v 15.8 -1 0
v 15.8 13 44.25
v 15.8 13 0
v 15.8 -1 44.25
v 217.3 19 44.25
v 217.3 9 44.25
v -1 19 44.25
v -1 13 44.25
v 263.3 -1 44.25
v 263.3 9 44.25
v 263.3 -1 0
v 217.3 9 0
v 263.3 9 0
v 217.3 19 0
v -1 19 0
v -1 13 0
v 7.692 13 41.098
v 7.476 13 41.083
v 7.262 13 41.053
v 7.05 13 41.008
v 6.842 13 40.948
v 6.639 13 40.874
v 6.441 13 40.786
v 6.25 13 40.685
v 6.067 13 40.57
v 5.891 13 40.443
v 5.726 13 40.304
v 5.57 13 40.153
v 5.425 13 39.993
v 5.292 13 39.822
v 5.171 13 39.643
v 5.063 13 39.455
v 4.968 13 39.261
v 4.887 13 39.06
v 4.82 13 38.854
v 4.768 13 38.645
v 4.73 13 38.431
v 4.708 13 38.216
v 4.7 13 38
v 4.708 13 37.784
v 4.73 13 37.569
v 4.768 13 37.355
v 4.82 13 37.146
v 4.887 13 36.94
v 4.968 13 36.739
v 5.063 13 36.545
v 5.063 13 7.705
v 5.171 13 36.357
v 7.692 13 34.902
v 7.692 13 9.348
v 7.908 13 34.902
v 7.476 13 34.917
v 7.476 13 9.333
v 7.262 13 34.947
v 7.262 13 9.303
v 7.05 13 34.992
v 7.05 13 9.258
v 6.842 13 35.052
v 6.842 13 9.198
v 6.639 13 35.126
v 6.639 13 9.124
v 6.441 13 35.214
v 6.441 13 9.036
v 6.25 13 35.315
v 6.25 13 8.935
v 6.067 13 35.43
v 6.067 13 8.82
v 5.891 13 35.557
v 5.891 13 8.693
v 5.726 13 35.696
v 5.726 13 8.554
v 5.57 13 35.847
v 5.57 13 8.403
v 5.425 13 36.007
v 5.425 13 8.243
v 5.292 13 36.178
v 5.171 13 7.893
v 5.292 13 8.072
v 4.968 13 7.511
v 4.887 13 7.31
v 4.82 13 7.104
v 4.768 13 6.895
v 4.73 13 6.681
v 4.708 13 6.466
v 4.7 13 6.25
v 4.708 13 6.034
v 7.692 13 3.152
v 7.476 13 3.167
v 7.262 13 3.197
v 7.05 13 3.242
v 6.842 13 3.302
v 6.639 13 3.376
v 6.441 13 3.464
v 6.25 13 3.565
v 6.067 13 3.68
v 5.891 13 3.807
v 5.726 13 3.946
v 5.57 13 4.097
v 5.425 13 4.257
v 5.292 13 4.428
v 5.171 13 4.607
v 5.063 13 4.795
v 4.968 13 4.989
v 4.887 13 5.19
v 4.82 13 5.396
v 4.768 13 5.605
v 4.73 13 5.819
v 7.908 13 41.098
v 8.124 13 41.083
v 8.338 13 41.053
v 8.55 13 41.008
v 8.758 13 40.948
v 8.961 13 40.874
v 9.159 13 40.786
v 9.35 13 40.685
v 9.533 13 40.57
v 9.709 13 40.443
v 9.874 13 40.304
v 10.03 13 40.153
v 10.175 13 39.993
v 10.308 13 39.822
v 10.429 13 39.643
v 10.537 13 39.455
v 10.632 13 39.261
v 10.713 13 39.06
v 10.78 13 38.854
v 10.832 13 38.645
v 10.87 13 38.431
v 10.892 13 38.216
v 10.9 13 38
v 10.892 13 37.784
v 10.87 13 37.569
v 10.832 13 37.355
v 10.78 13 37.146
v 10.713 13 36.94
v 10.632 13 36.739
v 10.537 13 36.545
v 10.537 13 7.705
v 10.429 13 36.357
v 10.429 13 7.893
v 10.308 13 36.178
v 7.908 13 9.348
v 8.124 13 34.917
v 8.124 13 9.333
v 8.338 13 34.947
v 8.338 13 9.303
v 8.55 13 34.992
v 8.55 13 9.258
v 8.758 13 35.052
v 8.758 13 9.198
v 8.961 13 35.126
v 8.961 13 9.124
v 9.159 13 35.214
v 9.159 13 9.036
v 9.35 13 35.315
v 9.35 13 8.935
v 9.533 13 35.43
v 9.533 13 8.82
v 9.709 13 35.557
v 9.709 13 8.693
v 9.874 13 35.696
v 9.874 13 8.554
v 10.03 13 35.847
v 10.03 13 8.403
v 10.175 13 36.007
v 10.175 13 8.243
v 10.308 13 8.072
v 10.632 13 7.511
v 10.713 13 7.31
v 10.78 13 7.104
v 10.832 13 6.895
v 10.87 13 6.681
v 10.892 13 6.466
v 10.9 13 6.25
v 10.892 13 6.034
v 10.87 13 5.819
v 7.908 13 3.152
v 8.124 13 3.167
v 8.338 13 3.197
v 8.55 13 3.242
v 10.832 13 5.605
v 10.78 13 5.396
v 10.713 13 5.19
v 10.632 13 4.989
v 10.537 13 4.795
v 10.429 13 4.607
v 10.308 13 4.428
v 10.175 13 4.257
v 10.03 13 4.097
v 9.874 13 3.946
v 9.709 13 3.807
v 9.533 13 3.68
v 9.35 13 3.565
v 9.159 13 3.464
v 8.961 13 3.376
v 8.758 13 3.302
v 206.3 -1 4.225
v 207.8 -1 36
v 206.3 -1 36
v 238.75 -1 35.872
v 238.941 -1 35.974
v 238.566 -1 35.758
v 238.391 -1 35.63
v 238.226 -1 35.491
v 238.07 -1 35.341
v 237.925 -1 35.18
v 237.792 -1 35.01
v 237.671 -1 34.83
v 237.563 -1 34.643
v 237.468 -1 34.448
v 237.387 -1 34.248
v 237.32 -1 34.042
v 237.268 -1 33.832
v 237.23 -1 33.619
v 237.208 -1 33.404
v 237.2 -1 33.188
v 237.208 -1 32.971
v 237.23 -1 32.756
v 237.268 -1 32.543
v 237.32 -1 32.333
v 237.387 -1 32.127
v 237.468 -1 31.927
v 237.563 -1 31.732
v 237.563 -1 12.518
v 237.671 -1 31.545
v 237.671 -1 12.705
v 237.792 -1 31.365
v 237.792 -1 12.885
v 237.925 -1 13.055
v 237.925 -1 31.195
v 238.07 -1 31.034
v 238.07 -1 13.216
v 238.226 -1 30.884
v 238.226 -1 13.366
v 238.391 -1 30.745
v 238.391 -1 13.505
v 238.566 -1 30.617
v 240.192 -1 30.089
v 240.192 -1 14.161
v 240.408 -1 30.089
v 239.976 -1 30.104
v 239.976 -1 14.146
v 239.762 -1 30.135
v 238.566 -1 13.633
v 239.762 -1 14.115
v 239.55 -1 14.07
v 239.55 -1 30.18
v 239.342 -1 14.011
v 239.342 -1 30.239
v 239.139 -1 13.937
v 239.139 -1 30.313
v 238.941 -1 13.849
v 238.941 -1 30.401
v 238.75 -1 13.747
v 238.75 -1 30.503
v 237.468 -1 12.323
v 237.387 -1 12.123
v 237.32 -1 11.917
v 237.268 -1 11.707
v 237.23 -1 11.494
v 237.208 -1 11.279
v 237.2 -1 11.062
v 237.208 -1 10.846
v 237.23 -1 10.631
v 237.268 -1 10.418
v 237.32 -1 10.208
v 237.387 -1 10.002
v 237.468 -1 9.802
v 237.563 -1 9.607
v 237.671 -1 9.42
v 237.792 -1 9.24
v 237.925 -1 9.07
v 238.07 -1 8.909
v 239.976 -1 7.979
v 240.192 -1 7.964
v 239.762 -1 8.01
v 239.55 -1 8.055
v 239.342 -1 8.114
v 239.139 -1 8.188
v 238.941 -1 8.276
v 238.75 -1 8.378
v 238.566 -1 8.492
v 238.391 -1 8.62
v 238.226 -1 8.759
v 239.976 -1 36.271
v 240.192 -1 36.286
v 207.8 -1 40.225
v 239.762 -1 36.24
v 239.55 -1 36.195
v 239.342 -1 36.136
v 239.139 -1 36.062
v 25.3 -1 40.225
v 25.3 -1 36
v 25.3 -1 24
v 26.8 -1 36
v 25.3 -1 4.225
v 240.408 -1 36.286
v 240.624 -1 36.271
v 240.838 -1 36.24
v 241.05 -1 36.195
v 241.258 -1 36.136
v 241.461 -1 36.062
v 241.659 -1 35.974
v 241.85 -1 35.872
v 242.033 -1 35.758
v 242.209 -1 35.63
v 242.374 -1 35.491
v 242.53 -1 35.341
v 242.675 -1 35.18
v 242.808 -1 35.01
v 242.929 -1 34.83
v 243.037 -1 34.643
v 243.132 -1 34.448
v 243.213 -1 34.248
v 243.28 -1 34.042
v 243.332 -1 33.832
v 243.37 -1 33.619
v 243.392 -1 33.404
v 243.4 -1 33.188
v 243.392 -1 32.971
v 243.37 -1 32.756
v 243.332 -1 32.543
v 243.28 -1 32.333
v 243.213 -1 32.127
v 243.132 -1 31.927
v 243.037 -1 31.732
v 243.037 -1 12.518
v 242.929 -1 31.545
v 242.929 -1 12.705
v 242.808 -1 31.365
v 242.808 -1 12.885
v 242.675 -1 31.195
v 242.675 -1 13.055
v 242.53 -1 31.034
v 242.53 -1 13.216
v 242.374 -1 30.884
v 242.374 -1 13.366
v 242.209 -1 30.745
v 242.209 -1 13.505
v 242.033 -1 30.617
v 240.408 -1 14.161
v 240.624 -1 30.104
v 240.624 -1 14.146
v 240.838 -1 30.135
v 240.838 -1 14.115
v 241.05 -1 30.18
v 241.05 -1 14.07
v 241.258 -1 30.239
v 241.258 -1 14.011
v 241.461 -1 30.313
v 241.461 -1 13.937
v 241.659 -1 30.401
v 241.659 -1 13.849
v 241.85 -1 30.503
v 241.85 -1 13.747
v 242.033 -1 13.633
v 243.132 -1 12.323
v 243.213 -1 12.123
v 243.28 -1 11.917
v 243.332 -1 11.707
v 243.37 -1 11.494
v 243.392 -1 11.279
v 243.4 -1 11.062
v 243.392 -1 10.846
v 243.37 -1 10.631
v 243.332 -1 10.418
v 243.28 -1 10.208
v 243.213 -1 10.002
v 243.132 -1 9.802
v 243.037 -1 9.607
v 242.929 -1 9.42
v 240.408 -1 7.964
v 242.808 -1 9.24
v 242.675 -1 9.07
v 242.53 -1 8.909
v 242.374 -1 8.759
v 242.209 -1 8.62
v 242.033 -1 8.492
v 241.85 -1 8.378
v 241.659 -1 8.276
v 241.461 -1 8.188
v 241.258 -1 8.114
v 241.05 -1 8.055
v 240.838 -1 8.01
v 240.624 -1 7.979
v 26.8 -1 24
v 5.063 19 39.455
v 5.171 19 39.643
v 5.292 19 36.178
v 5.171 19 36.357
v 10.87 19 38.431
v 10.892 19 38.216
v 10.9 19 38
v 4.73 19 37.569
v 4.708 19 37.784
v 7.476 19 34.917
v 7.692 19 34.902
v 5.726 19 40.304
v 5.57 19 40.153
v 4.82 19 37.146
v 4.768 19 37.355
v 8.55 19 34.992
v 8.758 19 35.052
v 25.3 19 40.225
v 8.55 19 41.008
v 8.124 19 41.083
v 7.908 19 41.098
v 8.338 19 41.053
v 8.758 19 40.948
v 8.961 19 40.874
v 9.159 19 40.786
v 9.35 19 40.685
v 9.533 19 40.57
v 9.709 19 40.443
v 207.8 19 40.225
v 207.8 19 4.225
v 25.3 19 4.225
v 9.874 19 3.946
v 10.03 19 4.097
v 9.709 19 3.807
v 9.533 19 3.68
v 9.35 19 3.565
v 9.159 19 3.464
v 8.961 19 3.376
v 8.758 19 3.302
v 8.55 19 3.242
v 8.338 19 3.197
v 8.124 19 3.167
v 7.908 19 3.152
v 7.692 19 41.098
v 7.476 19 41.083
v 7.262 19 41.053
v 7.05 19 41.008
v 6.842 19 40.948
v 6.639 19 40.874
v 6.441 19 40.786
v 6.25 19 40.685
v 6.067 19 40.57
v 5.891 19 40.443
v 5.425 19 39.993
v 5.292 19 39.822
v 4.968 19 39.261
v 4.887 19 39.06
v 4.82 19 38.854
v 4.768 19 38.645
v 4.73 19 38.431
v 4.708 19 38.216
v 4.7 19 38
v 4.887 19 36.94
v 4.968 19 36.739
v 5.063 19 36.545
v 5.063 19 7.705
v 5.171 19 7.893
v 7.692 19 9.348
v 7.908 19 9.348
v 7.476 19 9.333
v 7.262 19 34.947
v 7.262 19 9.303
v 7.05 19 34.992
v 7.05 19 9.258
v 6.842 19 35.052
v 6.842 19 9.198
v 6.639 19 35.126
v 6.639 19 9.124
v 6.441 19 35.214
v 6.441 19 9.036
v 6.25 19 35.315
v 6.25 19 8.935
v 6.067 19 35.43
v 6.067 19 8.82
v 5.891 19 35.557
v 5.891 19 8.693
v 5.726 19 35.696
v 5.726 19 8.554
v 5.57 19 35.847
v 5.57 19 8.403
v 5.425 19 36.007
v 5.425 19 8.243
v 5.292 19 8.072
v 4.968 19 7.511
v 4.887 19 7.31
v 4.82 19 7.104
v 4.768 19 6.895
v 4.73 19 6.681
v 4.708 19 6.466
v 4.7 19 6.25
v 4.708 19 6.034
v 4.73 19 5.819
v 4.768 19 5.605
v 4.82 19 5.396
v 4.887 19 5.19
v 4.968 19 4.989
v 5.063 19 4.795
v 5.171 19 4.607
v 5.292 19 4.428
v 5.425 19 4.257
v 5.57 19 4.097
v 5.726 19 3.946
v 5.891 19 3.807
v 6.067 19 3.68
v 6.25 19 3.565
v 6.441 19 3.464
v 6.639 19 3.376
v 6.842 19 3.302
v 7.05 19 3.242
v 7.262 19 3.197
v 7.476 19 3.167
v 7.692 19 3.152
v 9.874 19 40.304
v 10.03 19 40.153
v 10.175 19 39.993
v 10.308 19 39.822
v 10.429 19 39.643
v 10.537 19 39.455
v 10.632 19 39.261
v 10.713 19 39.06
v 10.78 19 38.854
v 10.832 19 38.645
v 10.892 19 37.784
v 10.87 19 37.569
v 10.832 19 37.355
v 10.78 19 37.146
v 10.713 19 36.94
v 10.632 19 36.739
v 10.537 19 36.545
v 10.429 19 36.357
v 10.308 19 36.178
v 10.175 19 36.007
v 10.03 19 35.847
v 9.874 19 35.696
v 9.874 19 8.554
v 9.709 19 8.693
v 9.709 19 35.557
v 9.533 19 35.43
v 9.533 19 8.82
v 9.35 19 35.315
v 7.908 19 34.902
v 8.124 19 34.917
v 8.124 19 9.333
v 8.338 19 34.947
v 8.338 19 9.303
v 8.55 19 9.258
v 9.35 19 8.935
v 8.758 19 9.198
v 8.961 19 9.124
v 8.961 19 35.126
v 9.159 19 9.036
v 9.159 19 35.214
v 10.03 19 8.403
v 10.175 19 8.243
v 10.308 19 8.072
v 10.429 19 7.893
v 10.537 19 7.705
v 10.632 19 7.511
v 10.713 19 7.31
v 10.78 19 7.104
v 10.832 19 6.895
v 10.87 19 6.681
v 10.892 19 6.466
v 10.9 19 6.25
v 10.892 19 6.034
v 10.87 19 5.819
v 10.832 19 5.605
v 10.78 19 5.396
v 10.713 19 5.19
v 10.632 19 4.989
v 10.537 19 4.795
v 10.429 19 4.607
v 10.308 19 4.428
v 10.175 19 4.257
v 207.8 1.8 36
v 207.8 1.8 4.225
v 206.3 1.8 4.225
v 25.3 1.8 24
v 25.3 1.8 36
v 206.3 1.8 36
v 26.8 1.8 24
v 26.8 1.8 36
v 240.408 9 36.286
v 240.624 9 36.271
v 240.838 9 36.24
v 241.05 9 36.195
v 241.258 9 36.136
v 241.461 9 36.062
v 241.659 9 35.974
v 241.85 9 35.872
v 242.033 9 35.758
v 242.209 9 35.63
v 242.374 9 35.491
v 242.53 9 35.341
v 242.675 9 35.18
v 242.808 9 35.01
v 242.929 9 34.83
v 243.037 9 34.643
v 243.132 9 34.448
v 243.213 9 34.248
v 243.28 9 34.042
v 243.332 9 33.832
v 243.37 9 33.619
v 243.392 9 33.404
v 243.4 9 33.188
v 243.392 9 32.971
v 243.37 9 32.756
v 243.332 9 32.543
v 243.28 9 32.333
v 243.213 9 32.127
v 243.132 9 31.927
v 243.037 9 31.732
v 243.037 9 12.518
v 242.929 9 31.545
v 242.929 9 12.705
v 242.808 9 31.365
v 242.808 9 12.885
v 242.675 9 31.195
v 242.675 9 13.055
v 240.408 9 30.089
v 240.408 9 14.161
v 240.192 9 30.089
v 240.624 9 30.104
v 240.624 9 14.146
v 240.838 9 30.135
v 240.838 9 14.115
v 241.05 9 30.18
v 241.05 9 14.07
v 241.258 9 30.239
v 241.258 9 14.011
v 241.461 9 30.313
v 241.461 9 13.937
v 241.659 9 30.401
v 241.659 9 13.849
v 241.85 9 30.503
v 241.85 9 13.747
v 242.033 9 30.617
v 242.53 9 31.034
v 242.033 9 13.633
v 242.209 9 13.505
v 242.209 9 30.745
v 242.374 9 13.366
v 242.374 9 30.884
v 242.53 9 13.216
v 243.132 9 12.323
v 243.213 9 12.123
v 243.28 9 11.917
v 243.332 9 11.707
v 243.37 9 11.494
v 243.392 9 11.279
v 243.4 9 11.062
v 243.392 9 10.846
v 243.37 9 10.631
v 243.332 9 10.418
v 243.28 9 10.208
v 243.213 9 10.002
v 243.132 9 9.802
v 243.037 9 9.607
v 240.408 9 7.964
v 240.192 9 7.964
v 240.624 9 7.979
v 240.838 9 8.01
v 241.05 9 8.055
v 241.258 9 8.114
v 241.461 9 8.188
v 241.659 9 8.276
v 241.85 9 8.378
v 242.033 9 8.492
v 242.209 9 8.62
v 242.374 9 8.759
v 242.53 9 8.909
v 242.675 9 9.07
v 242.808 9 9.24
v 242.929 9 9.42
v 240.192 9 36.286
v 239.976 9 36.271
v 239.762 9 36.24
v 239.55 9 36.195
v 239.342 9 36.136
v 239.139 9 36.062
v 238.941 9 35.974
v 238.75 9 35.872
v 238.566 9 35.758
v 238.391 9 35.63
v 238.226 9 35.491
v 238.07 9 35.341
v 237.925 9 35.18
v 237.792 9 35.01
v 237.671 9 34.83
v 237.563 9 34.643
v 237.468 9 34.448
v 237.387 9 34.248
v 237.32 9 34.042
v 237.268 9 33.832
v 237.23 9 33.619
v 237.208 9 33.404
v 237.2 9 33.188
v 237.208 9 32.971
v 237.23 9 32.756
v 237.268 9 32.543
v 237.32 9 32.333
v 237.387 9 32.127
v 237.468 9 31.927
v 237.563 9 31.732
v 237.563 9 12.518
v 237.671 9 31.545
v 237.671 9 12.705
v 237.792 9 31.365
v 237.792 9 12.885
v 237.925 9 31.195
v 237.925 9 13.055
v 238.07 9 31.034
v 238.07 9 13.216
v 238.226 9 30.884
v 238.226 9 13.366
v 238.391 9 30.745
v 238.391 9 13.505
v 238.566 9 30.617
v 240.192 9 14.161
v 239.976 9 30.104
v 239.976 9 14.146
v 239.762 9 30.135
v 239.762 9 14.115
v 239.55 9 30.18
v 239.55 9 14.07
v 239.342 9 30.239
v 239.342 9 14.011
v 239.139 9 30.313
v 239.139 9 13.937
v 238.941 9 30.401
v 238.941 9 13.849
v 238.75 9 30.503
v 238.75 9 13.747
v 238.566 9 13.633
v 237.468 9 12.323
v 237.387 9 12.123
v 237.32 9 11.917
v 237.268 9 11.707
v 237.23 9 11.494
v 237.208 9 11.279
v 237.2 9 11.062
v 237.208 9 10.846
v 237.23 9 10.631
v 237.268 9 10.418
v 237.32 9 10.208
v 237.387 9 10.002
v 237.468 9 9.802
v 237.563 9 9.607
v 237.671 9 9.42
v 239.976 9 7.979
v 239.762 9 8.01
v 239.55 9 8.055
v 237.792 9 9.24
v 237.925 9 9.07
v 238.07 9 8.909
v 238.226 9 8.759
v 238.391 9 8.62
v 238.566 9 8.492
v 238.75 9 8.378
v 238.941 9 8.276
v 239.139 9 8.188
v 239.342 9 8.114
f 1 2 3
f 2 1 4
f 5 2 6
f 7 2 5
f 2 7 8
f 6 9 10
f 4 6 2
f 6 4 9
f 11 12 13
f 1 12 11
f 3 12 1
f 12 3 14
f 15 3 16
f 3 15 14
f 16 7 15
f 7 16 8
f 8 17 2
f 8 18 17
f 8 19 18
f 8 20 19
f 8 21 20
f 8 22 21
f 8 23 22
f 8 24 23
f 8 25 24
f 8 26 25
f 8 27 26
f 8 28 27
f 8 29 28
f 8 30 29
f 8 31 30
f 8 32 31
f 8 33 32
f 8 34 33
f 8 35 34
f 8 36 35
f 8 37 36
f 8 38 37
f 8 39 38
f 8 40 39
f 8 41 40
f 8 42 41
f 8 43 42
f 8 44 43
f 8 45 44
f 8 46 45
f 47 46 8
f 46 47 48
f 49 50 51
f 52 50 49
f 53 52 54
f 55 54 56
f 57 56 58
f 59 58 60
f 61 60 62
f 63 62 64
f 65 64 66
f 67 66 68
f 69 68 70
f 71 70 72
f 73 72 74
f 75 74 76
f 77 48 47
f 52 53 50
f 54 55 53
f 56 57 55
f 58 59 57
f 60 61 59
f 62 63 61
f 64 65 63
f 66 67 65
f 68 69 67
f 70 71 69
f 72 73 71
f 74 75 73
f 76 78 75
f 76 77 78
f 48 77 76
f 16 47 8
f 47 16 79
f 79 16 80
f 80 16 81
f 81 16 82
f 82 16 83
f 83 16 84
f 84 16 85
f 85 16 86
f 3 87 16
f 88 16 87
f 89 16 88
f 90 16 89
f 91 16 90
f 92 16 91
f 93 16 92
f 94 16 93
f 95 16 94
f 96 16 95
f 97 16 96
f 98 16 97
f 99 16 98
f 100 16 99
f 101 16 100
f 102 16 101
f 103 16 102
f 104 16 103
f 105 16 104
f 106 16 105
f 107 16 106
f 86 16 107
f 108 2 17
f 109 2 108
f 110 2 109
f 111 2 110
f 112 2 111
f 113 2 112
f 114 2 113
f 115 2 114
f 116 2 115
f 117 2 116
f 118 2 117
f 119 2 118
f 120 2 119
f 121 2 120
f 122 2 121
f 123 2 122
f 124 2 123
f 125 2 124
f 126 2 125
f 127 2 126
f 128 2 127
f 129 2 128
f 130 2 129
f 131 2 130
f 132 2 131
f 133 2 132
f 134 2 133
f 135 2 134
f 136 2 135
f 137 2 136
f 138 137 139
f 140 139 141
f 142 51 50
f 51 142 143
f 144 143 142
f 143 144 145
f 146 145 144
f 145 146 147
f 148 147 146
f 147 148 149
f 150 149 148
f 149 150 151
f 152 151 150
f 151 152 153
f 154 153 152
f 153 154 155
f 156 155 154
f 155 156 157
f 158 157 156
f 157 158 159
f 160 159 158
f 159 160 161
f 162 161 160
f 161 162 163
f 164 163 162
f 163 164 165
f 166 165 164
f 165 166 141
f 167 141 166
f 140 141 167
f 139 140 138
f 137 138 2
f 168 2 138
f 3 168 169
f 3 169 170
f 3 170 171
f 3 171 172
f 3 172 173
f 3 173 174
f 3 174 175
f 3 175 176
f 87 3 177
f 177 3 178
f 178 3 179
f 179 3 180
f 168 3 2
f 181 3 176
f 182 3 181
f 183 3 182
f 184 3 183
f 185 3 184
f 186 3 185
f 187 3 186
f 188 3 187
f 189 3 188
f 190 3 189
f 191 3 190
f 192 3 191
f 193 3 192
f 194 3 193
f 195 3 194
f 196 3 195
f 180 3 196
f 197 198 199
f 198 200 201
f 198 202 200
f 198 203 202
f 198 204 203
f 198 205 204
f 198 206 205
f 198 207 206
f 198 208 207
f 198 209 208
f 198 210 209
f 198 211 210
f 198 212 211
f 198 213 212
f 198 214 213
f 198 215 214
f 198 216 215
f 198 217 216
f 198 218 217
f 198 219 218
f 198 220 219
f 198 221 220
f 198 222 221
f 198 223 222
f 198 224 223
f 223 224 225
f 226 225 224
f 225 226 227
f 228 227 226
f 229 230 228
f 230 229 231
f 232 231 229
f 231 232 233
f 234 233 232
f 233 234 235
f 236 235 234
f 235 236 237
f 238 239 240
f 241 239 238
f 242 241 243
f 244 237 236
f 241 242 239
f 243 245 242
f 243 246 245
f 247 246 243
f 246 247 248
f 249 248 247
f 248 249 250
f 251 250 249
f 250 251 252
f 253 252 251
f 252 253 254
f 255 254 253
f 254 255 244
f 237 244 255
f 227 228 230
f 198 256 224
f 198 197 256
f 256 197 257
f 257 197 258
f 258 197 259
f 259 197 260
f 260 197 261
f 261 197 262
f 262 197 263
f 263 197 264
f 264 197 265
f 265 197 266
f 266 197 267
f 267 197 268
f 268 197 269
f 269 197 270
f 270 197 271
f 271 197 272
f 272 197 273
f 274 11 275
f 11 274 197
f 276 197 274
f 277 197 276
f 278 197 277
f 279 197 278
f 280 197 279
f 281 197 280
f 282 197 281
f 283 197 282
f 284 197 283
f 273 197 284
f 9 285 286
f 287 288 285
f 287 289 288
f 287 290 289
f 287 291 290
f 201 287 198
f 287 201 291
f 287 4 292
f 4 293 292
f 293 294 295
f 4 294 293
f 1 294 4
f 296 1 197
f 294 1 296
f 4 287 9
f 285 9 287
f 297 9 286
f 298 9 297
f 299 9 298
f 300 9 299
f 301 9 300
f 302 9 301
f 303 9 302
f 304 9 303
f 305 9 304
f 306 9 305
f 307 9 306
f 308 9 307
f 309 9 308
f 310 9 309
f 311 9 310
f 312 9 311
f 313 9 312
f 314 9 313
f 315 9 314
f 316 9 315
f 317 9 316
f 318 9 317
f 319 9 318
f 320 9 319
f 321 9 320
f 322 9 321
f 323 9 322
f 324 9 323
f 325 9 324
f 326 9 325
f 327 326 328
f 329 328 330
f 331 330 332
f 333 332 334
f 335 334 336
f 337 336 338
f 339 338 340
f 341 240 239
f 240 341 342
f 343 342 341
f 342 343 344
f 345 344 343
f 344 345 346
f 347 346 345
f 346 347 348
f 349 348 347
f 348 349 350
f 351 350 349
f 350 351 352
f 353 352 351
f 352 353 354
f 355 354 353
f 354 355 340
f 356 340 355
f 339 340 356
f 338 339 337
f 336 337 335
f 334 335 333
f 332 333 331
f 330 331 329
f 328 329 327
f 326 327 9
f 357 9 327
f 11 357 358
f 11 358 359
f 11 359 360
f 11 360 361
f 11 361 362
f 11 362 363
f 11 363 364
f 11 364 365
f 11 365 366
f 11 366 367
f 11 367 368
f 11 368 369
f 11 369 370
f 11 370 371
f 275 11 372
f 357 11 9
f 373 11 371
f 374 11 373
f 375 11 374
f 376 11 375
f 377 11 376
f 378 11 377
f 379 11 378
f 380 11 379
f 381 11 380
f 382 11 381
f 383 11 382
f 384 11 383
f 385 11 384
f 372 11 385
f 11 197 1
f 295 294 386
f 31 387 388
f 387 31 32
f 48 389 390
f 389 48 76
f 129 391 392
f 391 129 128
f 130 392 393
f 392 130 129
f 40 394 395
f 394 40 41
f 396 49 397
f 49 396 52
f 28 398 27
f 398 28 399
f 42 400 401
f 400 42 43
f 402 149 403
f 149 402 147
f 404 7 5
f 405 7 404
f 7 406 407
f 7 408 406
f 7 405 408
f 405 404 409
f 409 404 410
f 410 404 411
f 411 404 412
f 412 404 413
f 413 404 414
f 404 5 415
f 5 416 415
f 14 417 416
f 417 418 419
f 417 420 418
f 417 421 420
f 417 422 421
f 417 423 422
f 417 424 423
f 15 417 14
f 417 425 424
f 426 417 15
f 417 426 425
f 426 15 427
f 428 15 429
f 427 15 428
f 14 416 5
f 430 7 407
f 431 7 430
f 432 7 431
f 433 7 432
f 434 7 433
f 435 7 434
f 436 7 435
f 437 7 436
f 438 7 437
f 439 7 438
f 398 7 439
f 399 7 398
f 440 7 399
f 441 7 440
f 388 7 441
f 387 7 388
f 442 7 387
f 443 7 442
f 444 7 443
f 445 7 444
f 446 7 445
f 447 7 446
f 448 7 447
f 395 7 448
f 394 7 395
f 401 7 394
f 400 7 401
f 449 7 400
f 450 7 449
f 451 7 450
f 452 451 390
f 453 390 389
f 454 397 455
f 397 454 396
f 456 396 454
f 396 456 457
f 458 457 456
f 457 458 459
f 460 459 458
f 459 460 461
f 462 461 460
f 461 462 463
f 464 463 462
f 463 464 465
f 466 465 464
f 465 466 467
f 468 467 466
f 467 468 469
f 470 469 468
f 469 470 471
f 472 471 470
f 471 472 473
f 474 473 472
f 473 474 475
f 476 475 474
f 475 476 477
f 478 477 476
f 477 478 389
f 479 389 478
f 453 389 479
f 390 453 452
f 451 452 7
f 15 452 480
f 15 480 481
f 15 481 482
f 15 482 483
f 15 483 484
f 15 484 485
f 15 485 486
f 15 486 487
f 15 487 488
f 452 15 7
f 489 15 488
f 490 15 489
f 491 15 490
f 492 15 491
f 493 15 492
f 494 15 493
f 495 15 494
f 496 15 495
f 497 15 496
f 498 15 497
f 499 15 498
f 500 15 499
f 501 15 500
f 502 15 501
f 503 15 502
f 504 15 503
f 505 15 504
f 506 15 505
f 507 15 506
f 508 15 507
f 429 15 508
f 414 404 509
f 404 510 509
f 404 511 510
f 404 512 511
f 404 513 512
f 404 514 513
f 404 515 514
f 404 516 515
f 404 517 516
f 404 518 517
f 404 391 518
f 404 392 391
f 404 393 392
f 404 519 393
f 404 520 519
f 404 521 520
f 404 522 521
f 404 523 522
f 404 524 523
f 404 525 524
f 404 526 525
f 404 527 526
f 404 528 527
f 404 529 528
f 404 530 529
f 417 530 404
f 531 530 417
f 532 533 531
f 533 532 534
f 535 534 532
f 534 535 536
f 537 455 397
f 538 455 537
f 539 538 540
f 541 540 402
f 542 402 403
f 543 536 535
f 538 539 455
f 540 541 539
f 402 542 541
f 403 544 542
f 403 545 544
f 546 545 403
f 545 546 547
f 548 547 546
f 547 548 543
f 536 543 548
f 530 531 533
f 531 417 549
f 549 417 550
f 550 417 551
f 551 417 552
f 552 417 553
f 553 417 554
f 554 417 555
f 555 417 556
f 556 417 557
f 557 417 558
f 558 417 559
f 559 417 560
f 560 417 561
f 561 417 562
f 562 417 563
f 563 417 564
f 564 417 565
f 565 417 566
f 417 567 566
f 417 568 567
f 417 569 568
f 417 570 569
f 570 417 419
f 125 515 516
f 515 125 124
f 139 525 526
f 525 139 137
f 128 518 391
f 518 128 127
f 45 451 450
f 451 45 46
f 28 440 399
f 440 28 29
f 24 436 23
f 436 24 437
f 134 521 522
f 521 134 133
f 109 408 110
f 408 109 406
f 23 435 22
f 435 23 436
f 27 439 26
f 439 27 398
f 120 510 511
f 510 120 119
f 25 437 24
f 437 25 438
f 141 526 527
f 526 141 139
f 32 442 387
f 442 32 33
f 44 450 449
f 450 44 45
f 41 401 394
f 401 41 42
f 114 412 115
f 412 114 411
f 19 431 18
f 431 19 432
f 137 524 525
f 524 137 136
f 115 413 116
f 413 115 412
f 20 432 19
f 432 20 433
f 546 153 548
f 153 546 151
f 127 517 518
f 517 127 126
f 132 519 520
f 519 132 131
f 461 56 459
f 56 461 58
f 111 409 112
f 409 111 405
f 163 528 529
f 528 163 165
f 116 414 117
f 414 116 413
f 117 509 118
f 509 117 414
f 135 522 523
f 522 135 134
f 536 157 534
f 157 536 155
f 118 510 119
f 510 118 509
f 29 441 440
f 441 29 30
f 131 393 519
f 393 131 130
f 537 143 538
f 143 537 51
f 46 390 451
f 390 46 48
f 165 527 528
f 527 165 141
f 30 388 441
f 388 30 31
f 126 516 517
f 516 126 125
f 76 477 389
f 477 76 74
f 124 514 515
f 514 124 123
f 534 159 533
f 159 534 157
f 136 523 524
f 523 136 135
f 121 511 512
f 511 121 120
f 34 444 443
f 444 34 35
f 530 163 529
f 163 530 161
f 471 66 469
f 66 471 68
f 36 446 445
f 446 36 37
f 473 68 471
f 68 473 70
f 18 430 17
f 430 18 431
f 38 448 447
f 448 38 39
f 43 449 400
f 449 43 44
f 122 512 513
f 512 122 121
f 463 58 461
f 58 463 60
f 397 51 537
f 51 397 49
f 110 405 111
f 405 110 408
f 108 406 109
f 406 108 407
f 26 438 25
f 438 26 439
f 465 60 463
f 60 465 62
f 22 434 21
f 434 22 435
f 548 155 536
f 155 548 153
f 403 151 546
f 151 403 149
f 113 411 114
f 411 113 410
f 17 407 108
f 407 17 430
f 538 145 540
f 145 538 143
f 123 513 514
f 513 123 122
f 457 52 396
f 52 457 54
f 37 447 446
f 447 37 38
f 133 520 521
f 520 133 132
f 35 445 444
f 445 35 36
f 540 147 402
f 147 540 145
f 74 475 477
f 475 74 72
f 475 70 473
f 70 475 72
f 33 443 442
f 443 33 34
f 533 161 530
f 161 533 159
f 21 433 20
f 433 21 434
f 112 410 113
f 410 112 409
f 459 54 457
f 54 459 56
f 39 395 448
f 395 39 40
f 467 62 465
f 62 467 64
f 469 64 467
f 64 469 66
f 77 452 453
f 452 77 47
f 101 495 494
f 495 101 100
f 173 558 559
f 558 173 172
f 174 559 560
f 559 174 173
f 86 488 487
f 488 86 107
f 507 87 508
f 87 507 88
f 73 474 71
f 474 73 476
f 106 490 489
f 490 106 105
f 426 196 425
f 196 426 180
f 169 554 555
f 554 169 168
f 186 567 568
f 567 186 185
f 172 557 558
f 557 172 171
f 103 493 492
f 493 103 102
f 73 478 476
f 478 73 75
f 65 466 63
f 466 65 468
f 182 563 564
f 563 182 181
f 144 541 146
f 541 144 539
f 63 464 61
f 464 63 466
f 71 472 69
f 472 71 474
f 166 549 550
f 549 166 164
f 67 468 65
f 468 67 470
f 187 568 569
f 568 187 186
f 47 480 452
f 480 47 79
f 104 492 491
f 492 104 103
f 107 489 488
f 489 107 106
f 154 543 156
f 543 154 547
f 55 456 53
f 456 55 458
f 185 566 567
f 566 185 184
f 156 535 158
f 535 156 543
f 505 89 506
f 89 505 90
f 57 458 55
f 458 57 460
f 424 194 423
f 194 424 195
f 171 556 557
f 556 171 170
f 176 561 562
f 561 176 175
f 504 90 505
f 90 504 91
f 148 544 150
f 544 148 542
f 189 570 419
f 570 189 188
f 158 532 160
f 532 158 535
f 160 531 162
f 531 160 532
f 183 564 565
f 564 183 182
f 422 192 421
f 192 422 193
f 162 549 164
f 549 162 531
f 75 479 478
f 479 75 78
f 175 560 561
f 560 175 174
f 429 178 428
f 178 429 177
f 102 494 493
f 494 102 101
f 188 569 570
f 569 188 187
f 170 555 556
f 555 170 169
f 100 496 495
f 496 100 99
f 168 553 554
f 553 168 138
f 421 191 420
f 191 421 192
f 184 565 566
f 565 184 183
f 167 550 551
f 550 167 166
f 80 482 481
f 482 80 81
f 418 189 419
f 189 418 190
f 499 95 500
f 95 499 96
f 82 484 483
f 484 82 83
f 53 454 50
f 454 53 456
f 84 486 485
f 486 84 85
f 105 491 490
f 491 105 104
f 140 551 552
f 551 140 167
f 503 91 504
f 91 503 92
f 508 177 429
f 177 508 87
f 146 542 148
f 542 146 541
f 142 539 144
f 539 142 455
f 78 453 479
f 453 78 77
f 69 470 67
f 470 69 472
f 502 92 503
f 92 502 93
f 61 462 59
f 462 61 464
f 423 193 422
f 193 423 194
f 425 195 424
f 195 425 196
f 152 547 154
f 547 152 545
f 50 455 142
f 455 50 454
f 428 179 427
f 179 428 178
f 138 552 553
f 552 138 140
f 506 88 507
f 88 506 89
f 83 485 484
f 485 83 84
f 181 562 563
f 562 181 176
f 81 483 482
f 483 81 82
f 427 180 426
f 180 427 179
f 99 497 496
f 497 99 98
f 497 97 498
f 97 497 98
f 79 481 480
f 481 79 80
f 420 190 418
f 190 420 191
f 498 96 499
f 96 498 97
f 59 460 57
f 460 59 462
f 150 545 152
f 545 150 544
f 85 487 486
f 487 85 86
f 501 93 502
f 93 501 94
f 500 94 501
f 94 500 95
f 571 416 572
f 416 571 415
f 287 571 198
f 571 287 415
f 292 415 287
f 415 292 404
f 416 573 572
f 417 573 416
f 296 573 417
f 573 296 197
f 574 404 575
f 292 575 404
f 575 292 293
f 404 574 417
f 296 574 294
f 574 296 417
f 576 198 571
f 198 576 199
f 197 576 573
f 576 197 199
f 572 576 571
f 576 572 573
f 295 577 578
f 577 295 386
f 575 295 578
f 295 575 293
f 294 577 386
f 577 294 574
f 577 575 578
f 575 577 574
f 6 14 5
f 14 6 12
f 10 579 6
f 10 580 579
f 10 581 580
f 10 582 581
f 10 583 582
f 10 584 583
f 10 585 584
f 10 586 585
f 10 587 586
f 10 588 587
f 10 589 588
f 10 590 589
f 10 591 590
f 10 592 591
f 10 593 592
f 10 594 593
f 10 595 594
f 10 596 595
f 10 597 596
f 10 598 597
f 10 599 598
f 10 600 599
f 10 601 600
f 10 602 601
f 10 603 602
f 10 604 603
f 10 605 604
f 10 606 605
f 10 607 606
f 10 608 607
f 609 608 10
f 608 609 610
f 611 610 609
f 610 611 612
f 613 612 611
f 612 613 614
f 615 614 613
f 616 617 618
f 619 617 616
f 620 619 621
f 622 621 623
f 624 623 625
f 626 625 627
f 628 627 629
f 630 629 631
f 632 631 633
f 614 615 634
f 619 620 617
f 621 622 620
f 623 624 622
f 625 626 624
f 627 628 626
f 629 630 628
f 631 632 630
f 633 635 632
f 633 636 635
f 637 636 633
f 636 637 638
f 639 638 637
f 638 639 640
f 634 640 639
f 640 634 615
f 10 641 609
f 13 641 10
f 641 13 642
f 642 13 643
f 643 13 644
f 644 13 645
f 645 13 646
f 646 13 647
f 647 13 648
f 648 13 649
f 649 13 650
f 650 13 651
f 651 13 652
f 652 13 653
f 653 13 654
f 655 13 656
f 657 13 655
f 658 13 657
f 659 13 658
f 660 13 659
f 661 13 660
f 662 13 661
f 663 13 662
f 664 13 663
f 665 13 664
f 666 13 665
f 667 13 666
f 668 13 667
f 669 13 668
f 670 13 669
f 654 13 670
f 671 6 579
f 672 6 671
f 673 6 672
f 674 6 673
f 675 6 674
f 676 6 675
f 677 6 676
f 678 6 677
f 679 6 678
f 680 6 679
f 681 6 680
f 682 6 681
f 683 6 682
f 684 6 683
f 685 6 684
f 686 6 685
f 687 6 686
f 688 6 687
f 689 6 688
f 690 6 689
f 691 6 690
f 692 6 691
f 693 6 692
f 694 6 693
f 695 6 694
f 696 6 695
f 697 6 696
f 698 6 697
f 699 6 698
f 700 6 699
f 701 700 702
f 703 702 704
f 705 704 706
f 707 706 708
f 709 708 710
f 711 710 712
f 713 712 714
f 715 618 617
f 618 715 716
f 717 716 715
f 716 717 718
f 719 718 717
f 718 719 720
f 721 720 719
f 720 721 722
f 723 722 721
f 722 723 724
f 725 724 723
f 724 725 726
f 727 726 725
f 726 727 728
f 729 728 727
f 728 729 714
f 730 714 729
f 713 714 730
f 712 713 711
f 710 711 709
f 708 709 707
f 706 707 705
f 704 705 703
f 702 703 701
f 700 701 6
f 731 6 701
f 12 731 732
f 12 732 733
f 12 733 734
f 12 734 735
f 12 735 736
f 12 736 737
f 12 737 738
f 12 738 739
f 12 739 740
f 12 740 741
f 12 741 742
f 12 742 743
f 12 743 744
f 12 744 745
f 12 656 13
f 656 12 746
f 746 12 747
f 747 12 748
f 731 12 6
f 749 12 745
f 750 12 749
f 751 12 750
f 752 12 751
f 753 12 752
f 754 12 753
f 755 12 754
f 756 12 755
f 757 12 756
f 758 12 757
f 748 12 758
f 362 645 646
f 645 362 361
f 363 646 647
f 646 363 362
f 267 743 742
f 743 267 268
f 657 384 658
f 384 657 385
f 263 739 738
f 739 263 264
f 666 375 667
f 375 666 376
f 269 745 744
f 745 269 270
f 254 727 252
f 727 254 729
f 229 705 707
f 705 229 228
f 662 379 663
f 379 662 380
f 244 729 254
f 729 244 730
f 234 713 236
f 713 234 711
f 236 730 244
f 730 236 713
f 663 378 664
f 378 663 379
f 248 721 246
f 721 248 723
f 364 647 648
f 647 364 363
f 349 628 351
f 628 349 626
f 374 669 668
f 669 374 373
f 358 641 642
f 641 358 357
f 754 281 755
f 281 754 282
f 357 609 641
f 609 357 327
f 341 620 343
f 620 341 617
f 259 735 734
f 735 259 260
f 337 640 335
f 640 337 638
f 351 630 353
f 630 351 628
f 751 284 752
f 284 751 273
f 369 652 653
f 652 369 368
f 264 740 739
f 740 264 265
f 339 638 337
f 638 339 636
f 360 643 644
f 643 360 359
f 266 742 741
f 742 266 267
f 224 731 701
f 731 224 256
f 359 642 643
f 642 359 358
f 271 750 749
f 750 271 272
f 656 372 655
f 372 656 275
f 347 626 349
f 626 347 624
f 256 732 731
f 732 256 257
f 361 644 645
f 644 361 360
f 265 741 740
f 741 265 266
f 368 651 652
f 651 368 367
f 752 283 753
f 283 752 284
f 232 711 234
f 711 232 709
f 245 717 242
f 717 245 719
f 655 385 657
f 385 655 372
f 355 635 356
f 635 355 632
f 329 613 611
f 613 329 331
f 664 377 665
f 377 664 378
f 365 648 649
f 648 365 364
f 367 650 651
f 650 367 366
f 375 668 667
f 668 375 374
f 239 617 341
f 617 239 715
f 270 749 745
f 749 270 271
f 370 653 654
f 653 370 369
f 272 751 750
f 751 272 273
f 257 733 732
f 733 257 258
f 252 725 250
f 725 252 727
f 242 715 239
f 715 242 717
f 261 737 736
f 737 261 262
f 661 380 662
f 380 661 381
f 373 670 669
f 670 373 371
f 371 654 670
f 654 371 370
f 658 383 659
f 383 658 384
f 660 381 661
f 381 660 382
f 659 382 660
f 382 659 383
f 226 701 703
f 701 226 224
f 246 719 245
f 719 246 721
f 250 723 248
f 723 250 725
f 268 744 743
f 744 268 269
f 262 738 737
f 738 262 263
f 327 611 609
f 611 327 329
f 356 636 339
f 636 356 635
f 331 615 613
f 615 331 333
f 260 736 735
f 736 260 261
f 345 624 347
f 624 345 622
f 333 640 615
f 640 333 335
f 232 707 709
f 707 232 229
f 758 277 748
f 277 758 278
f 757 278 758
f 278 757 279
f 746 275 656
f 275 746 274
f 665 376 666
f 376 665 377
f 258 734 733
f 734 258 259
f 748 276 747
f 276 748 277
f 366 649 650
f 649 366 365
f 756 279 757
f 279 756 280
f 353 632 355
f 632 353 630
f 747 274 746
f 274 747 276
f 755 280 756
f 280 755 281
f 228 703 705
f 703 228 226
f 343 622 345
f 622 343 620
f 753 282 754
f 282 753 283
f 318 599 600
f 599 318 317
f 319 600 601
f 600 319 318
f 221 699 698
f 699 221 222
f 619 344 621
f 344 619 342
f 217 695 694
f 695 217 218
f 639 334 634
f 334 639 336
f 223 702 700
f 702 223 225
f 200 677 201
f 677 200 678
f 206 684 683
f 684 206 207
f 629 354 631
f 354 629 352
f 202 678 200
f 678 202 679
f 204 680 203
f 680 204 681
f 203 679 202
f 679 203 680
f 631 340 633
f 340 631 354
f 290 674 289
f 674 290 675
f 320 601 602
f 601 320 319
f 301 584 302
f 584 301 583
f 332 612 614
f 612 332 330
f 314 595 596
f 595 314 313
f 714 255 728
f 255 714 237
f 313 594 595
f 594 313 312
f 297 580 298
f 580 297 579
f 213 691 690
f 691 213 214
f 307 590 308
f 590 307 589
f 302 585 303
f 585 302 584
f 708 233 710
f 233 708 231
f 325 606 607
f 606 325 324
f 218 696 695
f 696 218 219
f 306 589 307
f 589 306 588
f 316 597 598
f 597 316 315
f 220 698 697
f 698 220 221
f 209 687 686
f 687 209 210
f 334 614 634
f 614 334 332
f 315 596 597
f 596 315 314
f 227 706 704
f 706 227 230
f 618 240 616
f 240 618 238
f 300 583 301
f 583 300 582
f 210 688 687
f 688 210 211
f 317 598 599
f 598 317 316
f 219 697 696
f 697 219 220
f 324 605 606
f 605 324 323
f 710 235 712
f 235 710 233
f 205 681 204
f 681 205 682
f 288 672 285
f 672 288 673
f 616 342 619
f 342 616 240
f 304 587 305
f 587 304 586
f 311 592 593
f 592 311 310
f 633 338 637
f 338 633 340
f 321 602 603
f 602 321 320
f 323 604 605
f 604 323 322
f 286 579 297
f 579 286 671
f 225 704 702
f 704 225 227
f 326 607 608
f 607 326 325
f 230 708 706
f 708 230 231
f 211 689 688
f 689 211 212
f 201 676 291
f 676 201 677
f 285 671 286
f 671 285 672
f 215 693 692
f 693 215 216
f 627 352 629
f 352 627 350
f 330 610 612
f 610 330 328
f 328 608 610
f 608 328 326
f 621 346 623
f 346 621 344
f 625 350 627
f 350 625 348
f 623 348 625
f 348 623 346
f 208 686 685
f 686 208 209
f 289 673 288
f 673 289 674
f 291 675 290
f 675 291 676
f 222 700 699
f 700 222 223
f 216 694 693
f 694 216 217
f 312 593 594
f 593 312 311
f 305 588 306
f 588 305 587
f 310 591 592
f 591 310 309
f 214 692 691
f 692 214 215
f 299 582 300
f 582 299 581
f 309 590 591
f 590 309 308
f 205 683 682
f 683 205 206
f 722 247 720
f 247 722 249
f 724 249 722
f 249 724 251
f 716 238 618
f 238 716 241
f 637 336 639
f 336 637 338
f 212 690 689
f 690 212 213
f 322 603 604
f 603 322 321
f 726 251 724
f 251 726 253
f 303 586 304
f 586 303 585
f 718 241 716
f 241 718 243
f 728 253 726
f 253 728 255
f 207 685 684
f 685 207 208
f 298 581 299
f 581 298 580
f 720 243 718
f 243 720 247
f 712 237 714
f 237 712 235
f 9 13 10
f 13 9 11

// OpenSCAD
// file: ../../../utils/constants.scad
$fn=90;  // accuracy

/* Server dimentions */

// one server unit
c_1u = 44.45;  

// two server unit
c_2u = c_1u*2; // 88.9

// total width
// The total with of the a server rack (19")
// this includes the mounting holes
c_tw  = 482.6; 

// Total inner width
// The distance between the mounting holes in the server rack
c_tiw = 450;


/* Rack hole dimentions */

// width distance rack holes
c_wdrh = 465;

// height distance rack holes
c_hdrh = 33;


/* dell optiplex 7040 micro usff dimentions */

// dell optiplex 7040 height
c_do7040h = 36;

// dell optiplex 7040 width
c_do7040w = 182;

// dell optiplex 7040 depth
c_do7040d = 179;

// dell optiplex 7040 rubber feet width distance
c_do7040rfwd = 14.9;

// dell optiplex 7040 rubber feet back depth distance
c_do7040rfbdd = 9.9;


/* Case dimentions */

// case height outer 
// A small margin is included to so that the case does not 
// exide two server units
c_2ucho = 88.6; 

// case height inner
// The thickness of the walls can then be calculated as (cho-chi)/2
c_2uchi = 76;

// distance between node holes
c_2udbnh = 82.3;

// case width outer
// as there are three parts of the rack server case we just devide
// the total inner width with three 
c_cwo = c_tiw/3; // 150

// case width inner
// Needs to be less than case width outer
c_cwi = 140;

// case depth thickness
// How thick the case should be. It needs to be thicker than the hight
// of the threaded insert.
c_cdt = 30;

// case inner side thickness
// The middle and the side case over lap so that a screw can be entered
// between the two cases. The cist is defined as the thickness of the part
// that does not overlap between the midle and side case.
c_cist = 3.5;

// nodes per case
c_npc = 7;
// main file
// TODO: This is not completed and unsure if I need this 
include <../../../utils/constants.scad>;

module usff7040Case(a_depth, a_isLeft) {
  m = 0.5; // margin, for usff7040 to fit?
  bottomMargin = 4;

  sideMountHoleDiameter = 6.2; 
  sideMountWidth = (c_tw - c_tiw)/2;
  sideMountThickness = 6;
  sideThickness = 10;

  holeDistance = 31.75;

  topHoleToFloor = 35;//-4;
  topHoleToBottom = topHoleToFloor-bottomMargin;
  topThickness = 5;
  topHoleToTop = topThickness+4;

  sideAttachersWidth = 2.8;
  sideAttachersThickness = 1.5;
  sideAttachersLeftHeight = 12;

  intersectionWidth = c_tiw-(c_do7040w*2+sideThickness*4);
  intersectionHoleDiameter = 6.2;

  height = c_1u-0.2; //c_hdrh+topToMountHole;
  width = c_do7040w+sideThickness*2+intersectionWidth+sideMountWidth;

  module usff7040() {
    difference() {
      // TODO: should translate in main
      // USFF7040
      translate([0,0,(c_1u-c_do7040h)/2])
      cube([c_do7040w+m, c_do7040d, c_do7040h]);

      //
      translate([c_do7040w+m-sideAttachersThickness,0,0])
      #cube([sideAttachersThickness, sideAttachersWidth, c_do7040h]);

      // 
      translate([0,0,c_do7040h-sideAttachersLeftHeight])
      #cube([sideAttachersThickness, sideAttachersWidth, sideAttachersLeftHeight]);
    }
  }

  module caseConnector() {
    // Cut out for for connecting sides
    translate([0,a_depth/2,0])
    cube([intersectionWidth, a_depth, height]);

    // Hole 1 for connecting sides
    translate([intersectionWidth/2, a_depth, height/4])
    rotate([90,0,0])
    cylinder(d=intersectionHoleDiameter, h=a_depth);

    // Hole 2 for connecting sides
    translate([intersectionWidth/2, a_depth, height*3/4])
    rotate([90,0,0])
    cylinder(d=intersectionHoleDiameter, h=a_depth);
  }

  module serverRackMount() {
    // Side mount
    cube([sideMountWidth+m, a_depth-sideMountThickness, height]);

    // Hole 1 for mounting to server rack
    translate([(c_tw-c_wdrh)/2,a_depth,(height+holeDistance)/2])
    rotate([90,0,0])
    #cylinder(d=sideMountHoleDiameter, h=a_depth);

    // Hole 2 for mounting to server rack
    translate([(c_tw-c_wdrh)/2,a_depth,(height-holeDistance)/2])
    rotate([90,0,0])
    #cylinder(d=sideMountHoleDiameter, h=a_depth);
  }

  difference() {
    cube([width, a_depth, height]);

    serverRackMount();

    translate([sideMountWidth+sideThickness,0,0])
    usff7040();

    translate([width-intersectionWidth,0,0])
    caseConnector();


    /*
    union() {
      if (a_isLeft) {
        translate([0,sideMountThickness,0])
        cube([sideMountWidth+m, a_depth, height]);

        translate([sideMountWidth+sideThickness,0,-topThickness])
        difference() {

          union() {
            translate([c_do7040w+m-sideAttachersThickness,0,0])
            #cube([sideAttachersThickness, sideAttachersWidth, c_do7040h]);

            translate([0,0,c_do7040h-sideAttachersLeftHeight])
            #cube([sideAttachersThickness, sideAttachersWidth, sideAttachersLeftHeight]);
          }
        }
      }
      else {
        translate([0,-sideMountThickness,0])
        cube([sideMountWidth+m, a_depth, height]);

        translate([sideMountWidth+sideThickness,0,-topThickness])
        difference() {
          cube([c_do7040w+m, a_depth, c_do7040h]);

          union() {
            translate([0,a_depth-sideAttachersWidth,0])
            #cube([sideAttachersThickness, sideAttachersWidth, c_do7040h]);

            translate([c_do7040w+m-sideAttachersThickness,a_depth-sideAttachersWidth,c_do7040h-sideAttachersLeftHeight])
            cube([sideAttachersThickness, sideAttachersWidth, sideAttachersLeftHeight]);
          }
        }
      }

      translate([width-intersectionWidth,a_depth/2,0])
      #cube([intersectionWidth, a_depth, height]);

      translate([width-intersectionWidth/2, a_depth, height/4])
      rotate([90,0,0])
      #cylinder(d=intersectionHoleDiameter, h=a_depth);

      translate([width-intersectionWidth/2, a_depth, height*3/4])
      rotate([90,0,0])
      #cylinder(d=intersectionHoleDiameter, h=a_depth);

      translate([(c_tw-c_wdrh)/2,a_depth,height-topHoleToTop])
      rotate([90,0,0])
      #cylinder(d=sideMountHoleDiameter, h=a_depth);
    }
    */
  }
}

translate([-1,-1,0])
usff7040Case(20,true);

//translate([c_tw,20,0])
//rotate([180,180,0])
//usff7040(20,false);
